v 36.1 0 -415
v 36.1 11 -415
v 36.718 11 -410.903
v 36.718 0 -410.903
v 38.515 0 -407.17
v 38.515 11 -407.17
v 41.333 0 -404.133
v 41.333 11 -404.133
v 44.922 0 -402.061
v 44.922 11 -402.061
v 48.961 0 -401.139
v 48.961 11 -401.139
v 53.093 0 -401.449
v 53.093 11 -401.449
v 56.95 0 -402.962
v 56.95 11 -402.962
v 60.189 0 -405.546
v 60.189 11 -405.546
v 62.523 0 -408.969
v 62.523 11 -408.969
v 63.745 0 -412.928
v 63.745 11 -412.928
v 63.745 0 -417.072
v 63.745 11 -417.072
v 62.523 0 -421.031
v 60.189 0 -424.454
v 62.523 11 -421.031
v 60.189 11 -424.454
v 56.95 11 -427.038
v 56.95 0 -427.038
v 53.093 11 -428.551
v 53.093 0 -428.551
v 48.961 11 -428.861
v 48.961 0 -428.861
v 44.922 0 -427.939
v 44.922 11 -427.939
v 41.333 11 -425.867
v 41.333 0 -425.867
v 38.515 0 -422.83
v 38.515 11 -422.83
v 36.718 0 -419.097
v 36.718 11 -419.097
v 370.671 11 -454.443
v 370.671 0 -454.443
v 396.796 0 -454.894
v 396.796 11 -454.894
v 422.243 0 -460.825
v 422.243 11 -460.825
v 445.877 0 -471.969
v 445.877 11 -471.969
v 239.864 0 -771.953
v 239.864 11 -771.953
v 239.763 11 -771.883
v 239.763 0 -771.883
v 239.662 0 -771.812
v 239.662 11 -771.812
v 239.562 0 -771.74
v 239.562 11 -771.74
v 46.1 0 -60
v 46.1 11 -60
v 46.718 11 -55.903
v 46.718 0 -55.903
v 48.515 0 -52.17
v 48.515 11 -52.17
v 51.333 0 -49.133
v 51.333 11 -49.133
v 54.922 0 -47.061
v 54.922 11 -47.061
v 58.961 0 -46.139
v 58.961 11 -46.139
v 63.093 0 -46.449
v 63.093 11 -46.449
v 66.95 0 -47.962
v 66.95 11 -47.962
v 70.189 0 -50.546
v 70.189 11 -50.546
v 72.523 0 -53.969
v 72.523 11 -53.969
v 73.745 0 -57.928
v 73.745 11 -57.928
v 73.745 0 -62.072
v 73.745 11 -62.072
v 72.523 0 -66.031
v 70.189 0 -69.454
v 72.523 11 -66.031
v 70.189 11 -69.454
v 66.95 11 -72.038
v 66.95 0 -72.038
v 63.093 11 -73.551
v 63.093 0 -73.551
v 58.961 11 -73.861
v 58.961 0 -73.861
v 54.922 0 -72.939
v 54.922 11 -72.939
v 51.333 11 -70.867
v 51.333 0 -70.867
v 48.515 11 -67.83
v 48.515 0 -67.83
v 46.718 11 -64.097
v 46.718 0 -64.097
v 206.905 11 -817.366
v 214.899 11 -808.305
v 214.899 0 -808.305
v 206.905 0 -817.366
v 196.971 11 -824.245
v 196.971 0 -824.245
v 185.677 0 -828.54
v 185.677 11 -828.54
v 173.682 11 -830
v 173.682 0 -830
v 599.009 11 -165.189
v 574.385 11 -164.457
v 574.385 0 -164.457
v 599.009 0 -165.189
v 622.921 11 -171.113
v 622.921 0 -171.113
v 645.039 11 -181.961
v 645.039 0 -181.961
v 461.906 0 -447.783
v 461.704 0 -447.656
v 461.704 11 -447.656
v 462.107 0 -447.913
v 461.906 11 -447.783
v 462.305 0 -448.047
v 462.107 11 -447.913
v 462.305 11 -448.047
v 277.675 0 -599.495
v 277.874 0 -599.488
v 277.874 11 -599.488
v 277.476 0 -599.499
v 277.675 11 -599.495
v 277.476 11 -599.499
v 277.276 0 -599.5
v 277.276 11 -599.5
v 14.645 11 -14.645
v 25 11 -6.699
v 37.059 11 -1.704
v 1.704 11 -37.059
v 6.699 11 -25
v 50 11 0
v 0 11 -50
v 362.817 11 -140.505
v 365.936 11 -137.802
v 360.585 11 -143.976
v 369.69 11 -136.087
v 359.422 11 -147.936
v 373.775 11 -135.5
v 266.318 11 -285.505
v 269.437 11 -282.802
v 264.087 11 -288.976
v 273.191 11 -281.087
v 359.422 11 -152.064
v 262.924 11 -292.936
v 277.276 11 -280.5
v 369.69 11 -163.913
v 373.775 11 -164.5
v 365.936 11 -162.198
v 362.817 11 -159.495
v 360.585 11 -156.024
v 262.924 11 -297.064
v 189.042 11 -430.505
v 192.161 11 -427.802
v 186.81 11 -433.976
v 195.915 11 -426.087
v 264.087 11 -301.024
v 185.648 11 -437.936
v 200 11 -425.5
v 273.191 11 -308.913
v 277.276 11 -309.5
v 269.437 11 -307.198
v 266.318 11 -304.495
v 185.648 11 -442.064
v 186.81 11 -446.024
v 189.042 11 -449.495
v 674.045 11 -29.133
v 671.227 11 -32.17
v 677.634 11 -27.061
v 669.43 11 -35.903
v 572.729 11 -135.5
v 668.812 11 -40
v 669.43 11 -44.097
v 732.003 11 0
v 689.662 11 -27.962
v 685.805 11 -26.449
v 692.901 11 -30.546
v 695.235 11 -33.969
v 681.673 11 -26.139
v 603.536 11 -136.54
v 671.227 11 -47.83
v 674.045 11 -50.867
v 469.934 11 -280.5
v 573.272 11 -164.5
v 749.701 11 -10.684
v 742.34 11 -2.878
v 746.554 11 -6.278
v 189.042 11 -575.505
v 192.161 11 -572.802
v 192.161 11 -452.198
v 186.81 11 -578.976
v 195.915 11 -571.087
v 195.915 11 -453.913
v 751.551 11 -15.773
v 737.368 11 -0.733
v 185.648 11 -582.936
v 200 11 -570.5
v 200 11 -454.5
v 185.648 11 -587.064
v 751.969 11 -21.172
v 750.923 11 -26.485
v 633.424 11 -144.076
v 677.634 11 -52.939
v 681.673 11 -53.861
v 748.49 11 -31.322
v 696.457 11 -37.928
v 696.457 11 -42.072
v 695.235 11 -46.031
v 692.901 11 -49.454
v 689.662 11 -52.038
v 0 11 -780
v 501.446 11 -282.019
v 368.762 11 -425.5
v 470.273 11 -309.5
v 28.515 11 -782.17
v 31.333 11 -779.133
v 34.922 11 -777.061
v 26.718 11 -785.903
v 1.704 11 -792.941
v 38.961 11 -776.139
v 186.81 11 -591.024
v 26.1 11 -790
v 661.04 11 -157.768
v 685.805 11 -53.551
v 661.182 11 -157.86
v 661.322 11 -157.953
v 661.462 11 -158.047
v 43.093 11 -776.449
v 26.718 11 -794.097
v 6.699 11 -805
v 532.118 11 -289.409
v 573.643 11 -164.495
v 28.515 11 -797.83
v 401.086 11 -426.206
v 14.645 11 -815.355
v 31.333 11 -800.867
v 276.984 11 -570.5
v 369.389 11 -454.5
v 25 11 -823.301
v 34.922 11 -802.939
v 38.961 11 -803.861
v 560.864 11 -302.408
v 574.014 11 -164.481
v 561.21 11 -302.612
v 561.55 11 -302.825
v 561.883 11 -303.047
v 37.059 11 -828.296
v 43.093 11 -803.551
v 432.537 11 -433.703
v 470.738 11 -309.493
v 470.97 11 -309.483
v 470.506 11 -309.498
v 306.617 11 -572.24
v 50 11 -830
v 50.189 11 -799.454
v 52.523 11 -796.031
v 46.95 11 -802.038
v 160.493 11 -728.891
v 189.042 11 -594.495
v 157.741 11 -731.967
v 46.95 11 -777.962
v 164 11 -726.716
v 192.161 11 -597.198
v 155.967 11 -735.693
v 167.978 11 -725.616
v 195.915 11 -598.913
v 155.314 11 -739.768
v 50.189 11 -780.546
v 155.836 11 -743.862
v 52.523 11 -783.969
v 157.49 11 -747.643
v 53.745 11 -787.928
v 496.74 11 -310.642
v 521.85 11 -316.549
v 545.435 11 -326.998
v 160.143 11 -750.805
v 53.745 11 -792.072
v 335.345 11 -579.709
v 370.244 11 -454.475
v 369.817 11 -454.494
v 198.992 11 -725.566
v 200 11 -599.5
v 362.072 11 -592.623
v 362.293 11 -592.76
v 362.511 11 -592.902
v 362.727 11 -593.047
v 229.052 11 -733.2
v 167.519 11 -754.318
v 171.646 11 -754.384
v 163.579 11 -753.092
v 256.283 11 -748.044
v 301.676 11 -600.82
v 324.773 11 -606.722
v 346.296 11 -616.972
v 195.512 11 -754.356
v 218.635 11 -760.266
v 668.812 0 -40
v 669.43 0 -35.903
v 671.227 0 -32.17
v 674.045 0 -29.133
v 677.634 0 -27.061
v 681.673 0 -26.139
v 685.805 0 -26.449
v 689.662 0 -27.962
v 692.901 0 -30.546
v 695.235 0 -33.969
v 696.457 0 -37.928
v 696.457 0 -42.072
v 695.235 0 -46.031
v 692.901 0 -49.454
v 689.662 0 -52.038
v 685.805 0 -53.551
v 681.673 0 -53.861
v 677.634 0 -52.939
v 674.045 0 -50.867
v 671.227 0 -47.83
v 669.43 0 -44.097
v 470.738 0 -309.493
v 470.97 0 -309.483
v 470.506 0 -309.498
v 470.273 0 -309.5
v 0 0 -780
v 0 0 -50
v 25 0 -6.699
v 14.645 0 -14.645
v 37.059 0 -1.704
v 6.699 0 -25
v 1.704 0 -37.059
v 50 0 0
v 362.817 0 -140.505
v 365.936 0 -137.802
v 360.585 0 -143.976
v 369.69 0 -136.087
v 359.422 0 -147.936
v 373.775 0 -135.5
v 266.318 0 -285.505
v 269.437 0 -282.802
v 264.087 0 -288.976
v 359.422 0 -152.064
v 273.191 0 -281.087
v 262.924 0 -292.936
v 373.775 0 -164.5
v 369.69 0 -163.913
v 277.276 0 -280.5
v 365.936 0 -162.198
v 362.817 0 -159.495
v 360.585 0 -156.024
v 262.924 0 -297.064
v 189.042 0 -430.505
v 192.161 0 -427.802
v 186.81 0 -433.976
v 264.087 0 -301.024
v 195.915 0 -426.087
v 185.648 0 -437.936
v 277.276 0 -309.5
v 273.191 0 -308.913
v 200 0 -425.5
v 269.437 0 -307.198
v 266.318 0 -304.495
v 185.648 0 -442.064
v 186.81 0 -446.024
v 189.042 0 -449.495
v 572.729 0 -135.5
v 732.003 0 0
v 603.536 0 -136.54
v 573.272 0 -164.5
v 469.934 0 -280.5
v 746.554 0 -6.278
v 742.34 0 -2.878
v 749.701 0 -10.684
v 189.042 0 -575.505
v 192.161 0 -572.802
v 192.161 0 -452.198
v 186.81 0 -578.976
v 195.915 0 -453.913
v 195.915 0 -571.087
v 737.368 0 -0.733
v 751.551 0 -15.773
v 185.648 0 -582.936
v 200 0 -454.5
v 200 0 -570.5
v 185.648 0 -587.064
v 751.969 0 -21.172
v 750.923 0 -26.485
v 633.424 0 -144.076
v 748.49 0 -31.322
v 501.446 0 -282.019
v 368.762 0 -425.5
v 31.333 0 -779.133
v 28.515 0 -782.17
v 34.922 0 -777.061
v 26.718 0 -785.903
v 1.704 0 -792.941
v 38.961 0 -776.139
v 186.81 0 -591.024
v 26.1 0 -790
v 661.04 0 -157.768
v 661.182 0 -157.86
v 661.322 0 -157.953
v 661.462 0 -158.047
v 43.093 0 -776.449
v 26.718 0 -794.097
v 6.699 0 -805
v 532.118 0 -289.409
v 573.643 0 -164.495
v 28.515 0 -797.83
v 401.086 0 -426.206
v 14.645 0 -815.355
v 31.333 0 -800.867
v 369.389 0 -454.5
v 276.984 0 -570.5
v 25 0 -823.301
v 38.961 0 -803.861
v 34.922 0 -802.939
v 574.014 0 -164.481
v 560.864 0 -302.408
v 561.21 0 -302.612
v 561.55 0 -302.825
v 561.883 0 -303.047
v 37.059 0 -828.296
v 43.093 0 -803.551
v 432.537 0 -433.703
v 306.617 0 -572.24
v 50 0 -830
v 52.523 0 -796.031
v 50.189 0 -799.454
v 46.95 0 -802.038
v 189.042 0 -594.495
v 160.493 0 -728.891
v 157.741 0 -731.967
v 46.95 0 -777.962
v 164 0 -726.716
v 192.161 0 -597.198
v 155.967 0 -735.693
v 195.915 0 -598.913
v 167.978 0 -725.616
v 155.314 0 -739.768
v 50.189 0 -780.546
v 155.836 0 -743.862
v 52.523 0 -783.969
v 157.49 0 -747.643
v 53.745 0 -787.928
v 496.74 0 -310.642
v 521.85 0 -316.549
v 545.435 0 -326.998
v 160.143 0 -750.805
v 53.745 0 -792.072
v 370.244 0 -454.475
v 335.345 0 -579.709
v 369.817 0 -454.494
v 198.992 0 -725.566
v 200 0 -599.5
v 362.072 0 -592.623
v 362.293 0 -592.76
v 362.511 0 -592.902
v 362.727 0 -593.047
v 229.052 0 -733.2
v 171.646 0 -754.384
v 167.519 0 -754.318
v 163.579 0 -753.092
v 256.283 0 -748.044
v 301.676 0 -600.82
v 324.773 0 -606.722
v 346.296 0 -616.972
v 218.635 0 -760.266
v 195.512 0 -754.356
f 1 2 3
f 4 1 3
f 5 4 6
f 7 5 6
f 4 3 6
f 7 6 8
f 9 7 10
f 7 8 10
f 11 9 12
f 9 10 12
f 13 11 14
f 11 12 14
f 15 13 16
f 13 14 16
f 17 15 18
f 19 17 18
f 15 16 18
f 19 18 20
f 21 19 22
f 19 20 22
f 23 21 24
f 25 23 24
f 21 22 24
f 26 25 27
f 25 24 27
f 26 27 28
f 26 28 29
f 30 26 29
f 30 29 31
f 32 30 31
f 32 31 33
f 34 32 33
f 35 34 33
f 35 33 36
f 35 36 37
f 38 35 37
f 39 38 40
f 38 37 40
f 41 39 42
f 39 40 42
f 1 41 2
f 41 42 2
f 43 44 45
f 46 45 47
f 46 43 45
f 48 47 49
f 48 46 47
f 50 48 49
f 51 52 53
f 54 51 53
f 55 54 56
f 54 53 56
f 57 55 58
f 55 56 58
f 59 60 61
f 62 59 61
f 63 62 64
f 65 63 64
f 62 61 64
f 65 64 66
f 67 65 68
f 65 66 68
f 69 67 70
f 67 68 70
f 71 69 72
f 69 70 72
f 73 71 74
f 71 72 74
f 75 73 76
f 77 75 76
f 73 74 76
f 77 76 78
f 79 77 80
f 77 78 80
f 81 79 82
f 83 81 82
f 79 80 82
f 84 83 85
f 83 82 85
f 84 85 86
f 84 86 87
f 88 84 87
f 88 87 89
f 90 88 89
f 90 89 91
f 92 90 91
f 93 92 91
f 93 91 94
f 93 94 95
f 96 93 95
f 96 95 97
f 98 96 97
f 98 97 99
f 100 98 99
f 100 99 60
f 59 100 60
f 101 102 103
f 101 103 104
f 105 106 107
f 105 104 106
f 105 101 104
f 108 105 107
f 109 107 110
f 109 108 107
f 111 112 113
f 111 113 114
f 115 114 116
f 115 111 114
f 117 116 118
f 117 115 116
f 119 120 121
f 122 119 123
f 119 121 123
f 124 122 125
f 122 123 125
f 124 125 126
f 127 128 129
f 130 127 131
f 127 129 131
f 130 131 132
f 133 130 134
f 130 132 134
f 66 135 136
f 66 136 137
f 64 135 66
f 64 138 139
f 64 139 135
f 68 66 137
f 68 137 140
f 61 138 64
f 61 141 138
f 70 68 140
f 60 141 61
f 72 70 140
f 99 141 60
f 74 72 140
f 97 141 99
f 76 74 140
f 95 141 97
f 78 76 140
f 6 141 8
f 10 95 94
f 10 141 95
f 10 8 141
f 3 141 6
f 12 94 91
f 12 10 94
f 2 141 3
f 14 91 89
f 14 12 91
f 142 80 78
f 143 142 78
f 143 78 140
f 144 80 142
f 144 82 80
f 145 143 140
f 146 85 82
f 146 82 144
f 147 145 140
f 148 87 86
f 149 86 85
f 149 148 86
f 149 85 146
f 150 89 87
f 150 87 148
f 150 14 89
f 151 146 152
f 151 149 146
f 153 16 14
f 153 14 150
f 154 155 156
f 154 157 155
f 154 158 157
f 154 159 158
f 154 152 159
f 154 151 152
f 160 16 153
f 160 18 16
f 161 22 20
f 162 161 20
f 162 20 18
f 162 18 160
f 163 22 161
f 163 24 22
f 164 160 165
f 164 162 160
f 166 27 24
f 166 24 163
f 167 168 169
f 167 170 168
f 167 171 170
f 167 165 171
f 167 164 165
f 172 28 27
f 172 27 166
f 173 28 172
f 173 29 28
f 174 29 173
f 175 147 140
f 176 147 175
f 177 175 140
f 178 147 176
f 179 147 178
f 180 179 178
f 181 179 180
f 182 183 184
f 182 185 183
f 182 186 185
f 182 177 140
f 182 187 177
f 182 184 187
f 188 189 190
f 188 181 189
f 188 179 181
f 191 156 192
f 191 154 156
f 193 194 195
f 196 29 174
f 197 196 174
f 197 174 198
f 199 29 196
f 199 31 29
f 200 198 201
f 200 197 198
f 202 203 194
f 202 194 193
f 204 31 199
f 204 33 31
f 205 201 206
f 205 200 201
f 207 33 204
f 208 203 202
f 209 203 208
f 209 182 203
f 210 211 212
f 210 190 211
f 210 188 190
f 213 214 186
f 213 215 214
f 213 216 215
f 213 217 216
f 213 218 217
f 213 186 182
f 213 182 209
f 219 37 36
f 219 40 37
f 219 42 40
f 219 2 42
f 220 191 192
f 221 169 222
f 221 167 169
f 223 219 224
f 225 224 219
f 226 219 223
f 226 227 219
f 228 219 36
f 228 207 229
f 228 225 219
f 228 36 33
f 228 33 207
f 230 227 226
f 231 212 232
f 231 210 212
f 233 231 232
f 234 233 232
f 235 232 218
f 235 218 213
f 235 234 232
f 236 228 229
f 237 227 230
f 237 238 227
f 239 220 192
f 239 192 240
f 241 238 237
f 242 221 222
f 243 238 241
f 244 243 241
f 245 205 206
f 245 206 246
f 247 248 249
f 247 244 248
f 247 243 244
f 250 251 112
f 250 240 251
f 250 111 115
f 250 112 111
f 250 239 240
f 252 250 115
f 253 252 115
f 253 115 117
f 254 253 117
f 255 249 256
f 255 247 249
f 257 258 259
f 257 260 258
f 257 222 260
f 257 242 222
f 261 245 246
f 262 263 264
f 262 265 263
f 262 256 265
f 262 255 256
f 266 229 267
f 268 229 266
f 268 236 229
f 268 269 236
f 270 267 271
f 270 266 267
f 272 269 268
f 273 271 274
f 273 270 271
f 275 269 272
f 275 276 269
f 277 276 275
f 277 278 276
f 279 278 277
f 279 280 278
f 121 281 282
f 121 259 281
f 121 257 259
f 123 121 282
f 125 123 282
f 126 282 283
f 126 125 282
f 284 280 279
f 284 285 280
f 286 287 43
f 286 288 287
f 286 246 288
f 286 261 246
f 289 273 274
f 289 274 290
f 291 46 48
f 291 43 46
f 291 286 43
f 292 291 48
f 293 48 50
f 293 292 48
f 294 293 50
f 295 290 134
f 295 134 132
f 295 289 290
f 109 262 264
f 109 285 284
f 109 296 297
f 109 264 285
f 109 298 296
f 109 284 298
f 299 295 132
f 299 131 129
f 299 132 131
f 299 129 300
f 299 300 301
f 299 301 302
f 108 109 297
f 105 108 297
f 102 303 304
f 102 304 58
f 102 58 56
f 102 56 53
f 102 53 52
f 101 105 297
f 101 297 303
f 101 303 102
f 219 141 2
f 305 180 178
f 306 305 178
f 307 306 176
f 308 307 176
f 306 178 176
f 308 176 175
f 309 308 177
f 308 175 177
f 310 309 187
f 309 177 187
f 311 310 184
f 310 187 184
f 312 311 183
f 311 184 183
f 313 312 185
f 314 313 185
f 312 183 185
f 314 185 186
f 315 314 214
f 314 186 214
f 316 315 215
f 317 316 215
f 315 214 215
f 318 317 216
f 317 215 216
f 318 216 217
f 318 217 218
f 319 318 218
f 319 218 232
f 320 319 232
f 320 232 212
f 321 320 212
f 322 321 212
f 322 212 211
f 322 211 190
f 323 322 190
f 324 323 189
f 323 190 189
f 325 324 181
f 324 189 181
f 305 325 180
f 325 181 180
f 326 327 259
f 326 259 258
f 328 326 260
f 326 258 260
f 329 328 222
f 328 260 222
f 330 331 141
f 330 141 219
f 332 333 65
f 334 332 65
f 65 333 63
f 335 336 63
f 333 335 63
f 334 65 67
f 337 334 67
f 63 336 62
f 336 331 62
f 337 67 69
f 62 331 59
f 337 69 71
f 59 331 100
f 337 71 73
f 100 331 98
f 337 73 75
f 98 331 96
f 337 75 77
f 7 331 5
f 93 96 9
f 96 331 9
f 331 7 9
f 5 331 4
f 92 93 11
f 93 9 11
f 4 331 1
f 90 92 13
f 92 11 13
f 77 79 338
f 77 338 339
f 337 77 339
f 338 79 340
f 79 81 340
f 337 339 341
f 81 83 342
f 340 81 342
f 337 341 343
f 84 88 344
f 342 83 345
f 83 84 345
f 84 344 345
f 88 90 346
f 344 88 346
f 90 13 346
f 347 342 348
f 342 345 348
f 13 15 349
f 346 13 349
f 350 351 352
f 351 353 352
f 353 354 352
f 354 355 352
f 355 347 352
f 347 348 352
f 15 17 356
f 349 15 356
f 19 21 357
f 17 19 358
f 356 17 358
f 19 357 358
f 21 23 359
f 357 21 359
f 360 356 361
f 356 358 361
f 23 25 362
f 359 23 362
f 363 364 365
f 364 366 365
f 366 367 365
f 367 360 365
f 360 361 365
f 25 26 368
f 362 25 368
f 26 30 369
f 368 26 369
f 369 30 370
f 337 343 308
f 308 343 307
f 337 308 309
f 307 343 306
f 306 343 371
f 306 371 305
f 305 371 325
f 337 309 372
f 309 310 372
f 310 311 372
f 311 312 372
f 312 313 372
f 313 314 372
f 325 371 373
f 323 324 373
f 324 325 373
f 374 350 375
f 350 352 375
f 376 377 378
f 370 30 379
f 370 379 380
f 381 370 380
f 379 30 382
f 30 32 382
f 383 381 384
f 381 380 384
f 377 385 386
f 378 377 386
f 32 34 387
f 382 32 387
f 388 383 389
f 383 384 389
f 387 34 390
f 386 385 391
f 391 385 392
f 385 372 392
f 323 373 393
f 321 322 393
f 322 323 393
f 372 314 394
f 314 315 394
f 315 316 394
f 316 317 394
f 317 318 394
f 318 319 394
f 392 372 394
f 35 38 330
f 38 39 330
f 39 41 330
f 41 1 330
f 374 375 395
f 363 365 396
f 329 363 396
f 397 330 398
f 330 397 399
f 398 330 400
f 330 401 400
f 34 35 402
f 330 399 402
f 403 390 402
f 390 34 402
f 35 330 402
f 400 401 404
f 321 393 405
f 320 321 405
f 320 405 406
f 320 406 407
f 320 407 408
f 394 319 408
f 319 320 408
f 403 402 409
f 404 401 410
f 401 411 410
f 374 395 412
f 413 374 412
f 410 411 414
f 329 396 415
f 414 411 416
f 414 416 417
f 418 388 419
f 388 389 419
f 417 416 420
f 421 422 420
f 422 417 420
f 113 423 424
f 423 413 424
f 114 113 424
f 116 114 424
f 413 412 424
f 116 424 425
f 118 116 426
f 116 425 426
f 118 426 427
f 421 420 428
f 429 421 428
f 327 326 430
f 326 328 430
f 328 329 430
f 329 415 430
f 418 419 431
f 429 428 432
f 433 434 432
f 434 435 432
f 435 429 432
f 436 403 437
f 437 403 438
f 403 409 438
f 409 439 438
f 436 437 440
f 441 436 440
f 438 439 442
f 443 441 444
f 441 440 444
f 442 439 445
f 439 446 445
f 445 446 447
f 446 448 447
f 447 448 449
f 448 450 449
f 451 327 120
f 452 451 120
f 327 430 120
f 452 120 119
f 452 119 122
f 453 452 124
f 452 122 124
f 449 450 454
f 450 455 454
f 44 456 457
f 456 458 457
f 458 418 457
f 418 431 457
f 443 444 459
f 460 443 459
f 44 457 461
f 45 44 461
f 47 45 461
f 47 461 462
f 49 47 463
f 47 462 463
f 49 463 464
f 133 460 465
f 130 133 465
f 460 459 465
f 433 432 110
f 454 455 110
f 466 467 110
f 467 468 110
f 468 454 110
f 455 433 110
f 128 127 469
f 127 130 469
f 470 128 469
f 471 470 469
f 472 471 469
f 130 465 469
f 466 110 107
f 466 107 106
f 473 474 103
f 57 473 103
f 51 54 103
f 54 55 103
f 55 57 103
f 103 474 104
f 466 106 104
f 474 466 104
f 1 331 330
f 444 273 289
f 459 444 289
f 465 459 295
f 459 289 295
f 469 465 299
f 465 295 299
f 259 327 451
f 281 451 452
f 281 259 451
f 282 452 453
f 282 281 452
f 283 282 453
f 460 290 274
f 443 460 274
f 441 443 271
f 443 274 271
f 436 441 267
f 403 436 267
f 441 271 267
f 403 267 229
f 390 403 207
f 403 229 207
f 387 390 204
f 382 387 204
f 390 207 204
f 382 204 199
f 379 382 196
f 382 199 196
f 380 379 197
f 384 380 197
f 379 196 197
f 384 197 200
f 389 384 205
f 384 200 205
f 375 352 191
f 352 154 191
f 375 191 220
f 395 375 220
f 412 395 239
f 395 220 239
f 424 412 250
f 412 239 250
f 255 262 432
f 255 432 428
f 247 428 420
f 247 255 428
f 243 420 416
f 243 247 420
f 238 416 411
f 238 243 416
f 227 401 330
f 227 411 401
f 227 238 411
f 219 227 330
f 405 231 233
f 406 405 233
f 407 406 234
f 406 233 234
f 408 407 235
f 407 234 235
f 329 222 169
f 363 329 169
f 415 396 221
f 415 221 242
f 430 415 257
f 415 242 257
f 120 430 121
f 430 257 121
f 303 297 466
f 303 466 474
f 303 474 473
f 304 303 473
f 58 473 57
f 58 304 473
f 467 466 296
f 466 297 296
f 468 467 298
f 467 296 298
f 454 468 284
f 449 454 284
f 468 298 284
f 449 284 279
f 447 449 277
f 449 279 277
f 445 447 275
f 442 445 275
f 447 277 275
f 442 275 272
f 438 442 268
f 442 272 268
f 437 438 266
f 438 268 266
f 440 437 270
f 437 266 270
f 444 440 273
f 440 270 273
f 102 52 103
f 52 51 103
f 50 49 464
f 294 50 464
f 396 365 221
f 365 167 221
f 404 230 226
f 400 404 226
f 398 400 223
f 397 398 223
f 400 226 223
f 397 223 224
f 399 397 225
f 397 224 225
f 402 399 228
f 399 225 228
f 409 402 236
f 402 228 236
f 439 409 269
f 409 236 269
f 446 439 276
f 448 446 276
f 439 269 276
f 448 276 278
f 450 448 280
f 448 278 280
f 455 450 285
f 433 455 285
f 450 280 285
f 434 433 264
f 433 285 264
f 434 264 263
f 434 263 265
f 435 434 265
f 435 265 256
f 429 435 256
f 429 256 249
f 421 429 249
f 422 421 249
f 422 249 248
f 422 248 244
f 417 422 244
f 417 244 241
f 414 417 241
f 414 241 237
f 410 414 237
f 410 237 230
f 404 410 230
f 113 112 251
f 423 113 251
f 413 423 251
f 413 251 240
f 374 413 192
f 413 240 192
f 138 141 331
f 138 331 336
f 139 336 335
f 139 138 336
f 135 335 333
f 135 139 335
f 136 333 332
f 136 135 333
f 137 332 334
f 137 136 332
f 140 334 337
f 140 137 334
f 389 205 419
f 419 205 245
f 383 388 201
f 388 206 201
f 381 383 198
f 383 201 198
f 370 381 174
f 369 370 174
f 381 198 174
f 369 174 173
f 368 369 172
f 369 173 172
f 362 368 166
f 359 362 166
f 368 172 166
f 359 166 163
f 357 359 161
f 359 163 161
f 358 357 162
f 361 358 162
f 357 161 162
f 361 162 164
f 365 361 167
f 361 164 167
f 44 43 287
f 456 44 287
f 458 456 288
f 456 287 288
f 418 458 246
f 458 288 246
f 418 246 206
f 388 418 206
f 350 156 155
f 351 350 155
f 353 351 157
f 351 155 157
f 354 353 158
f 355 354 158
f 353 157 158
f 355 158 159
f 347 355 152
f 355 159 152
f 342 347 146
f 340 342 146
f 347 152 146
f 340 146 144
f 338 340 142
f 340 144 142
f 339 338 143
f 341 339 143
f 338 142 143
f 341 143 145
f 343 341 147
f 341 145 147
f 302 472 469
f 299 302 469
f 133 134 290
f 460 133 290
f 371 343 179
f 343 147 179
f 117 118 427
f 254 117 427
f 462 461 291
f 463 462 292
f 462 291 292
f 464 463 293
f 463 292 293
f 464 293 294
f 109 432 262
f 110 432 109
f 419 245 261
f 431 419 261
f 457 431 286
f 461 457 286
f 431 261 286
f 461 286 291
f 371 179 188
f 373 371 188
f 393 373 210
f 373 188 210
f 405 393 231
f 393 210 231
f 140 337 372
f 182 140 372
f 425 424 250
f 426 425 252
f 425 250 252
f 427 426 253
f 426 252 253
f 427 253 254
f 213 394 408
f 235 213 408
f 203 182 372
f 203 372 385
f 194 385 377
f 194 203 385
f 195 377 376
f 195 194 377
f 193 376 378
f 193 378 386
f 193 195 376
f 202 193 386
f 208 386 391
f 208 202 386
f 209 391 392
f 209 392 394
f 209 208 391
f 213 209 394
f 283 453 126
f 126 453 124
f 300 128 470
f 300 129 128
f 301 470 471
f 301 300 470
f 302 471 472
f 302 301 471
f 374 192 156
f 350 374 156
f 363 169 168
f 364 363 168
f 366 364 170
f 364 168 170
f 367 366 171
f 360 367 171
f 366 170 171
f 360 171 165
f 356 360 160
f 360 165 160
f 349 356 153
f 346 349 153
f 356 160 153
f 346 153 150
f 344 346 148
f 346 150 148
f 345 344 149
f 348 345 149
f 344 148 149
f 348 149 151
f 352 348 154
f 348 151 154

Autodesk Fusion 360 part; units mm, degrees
sketch "Sketch1" plane through (0, 0, 0) normal (0, 1, 0) x (1, 0, 0)
  line L0 (0, 0) -> (0, 830)
  line L1 (0, 830) -> (200, 830)
  line L2 (0, 0) -> (770, 0)
  line L3 (770, 0) -> (200, 830)
  dimension "d1" = 830
  dimension "d2" = 770
extrude "Extrude1" add sketch "Sketch1" along normal blind 11
sketch "Sketch2" plane through (0, 11, 0) normal (0, 1, 0) x (-1, 0, 0)
  line L0 (0, 0) -> (-770, 0)
  line L1 (-770, 0) -> (-200, -830)
  line L2 (-200, -830) -> (0, -830)
  line L3 (0, -830) -> (0, 0)
  arc A0 (-167.9783, -725.6164) -> (-256.5823, -748.2599) centre (-183.687, -848.8237) ccw
  arc A1 (-171.646, -754.3836) -> (-167.9783, -725.6164) centre (-169.8121, -740) ccw
  arc A2 (-171.646, -754.3836) -> (-239.5623, -771.7401) centre (-183.687, -848.8237) ccw
  arc A3 (-256.5823, -748.2599) -> (-239.5623, -771.7401) centre (-248.0723, -760) ccw
  arc A4 (-169.8121, -740) -> (-248.0723, -760) centre (-183.687, -848.8237) ccw construction
  arc A5 (-277.8741, -599.4877) -> (-346.9644, -617.3771) centre (-282.9401, -722.2833) ccw
  arc A6 (-277.8741, -599.4877) -> (-276.6787, -570.5123) centre (-277.2764, -585) ccw
  arc A7 (-276.6787, -570.5123) -> (-362.0718, -592.6229) centre (-282.9401, -722.2833) ccw
  arc A8 (-362.0718, -592.6229) -> (-346.9644, -617.3771) centre (-354.5181, -605) ccw
  arc A9 (-277.2764, -585) -> (-354.5181, -605) centre (-282.9401, -722.2833) ccw construction
  arc A10 (-370.6712, -454.4432) -> (-446.4891, -472.3442) centre (-381.6102, -577.6218) ccw
  arc A11 (-370.6712, -454.4432) -> (-368.1059, -425.5568) centre (-369.3886, -440) ccw
  arc A12 (-368.1059, -425.5568) -> (-461.7037, -447.6558) centre (-381.6102, -577.6218) ccw
  arc A13 (-461.7037, -447.6558) -> (-446.4891, -472.3442) centre (-454.0964, -460) ccw
  arc A14 (-369.3886, -440) -> (-454.0964, -460) centre (-381.6102, -577.6218) ccw construction
  arc A15 (-470.9702, -309.4832) -> (-546.4851, -327.592) centre (-477.6426, -448.1642) ccw
  arc A16 (-470.9702, -309.4832) -> (-469.5765, -280.5168) centre (-470.2734, -295) ccw
  arc A17 (-469.5765, -280.5168) -> (-560.8643, -302.408) centre (-477.6426, -448.1642) ccw
  arc A18 (-560.8643, -302.408) -> (-546.4851, -327.592) centre (-553.6747, -315) ccw
  arc A19 (-470.2734, -295) -> (-553.6747, -315) centre (-477.6426, -448.1642) ccw construction
  arc A20 (-574.3852, -164.4572) -> (-645.4659, -182.2316) centre (-583.2764, -279.9159) ccw
  arc A21 (-574.3852, -164.4572) -> (-572.1585, -135.5428) centre (-573.2718, -150) ccw
  arc A22 (-572.1585, -135.5428) -> (-661.0401, -157.7684) centre (-583.2764, -279.9159) ccw
  arc A23 (-661.0401, -157.7684) -> (-645.4659, -182.2316) centre (-653.253, -170) ccw
  arc A24 (-573.2718, -150) -> (-653.253, -170) centre (-583.2764, -279.9159) ccw construction
  line L4 (-573.2718, -164.5) -> (-373.7749, -164.5)
  arc A25 (-373.7749, -164.5) -> (-373.7749, -135.5) centre (-373.7749, -150) ccw
  line L5 (-373.7749, -135.5) -> (-573.2718, -135.5)
  arc A26 (-573.2718, -135.5) -> (-573.2718, -164.5) centre (-573.2718, -150) ccw
  line L6 (-573.2718, -150) -> (-373.7749, -150) construction
  line L7 (-470.2734, -309.5) -> (-277.2764, -309.5)
  arc A27 (-277.2764, -309.5) -> (-277.2764, -280.5) centre (-277.2764, -295) ccw
  line L8 (-277.2764, -280.5) -> (-470.2734, -280.5)
  arc A28 (-470.2734, -280.5) -> (-470.2734, -309.5) centre (-470.2734, -295) ccw
  line L9 (-470.2734, -295) -> (-277.2764, -295) construction
  line L10 (-369.3886, -454.5) -> (-200, -454.5)
  arc A29 (-200, -454.5) -> (-200, -425.5) centre (-200, -440) ccw
  line L11 (-200, -425.5) -> (-369.3886, -425.5)
  arc A30 (-369.3886, -425.5) -> (-369.3886, -454.5) centre (-369.3886, -440) ccw
  line L12 (-369.3886, -440) -> (-200, -440) construction
  line L13 (-277.2764, -599.5) -> (-200, -599.5)
  arc A31 (-200, -599.5) -> (-200, -570.5) centre (-200, -585) ccw
  line L14 (-200, -570.5) -> (-277.2764, -570.5)
  arc A32 (-277.2764, -570.5) -> (-277.2764, -599.5) centre (-277.2764, -585) ccw
  line L15 (-277.2764, -585) -> (-200, -585) construction
  dimension "d13" = 90
  dimension "d14" = 245
  dimension "d15" = 390
  dimension "d16" = 390
  dimension "d17" = 535
  dimension "d18" = 535
  dimension "d19" = 680
  dimension "d20" = 680
  dimension "d21" = 29
  dimension "d22" = 29
  dimension "d23" = 29
  dimension "d24" = 29
  dimension "d25" = 29
  dimension "d26" = 20
  dimension "d27" = 20
  dimension "d28" = 20
  dimension "d29" = 20
  dimension "d30" = 20
  dimension "d31" = 29
  dimension "d32" = 29
  dimension "d33" = 29
  dimension "d40" = 29
extrude "Extrude2" cut sketch "Sketch2" against normal blind 12 contours L1 A20 A22 A23 L5 A26 | L1 A20 A23 | L1 A0 A3 | L1 A0 A1 A2 A3 | L1 A15 A17 A18 L8 A28 | L1 A15 A18 | A21 A22 L5 A26 | A21 A22 L4 A25 L5 | L1 A5 A8 | L1 A5 A7 A8 L14 A32 | L1 A10 A12 A13 L11 A30 | L1 A10 A13 | A16 A17 L8 A28 | A16 A17 L7 A27 L8 | A6 A7 L14 A32 | A11 A12 L11 A30 | A11 A12 L10 A29 L11
fillet "Fillet1" radius 50 1 edges at (0, 5.5, -830)
fillet "Fillet2" radius 50 1 edges at (200, 5.5, -830)
fillet "Fillet3" radius 50 1 edges at (0, 5.5, 0)
fillet "Fillet4" radius 20 1 edges at (770, 5.5, 0)
extrude "Extrude3" cut sketch "Sketch2" against normal blind 12 contours A6 A7 L13 A31 L14
sketch "Sketch3" plane through (0, 11, 0) normal (0, 1, 0) x (-1, 0, 0)
  line L0 (-276.9849, -570.5) -> (-200, -570.5)
  arc A0 (-200, -599.5) -> (-200, -570.5) centre (-200, -585) ccw
  line L1 (-200, -599.5) -> (-277.2764, -599.5)
  arc A1 (-277.8741, -599.4877) -> (-277.2764, -599.5) centre (-277.2764, -585) ccw
  arc A2 (-277.8741, -599.4877) -> (-346.2962, -616.9722) centre (-282.9401, -722.2833) ccw
  line L2 (-346.2962, -616.9722) -> (-256.2832, -748.0438)
  arc A3 (-167.9783, -725.6164) -> (-256.2832, -748.0438) centre (-183.687, -848.8237) ccw
  arc A4 (-171.646, -754.3836) -> (-167.9783, -725.6164) centre (-169.8121, -740) ccw
  arc A5 (-171.646, -754.3836) -> (-239.5623, -771.7401) centre (-183.687, -848.8237) ccw
  arc A6 (-239.8637, -771.9528) -> (-239.5623, -771.7401) centre (-248.0723, -760) ccw
  line L3 (-239.8637, -771.9528) -> (-214.8987, -808.3054)
  arc A7 (-214.8987, -808.3054) -> (-173.6821, -830) centre (-173.6821, -780) ccw
  line L4 (-173.6821, -830) -> (-50, -830)
  arc A8 (-50, -830) -> (0, -780) centre (-50, -780) ccw
  line L5 (0, -780) -> (0, -50)
  arc A9 (0, -50) -> (-50, 0) centre (-50, -50) ccw
  line L6 (-50, 0) -> (-732.003, 0)
  arc A10 (-732.003, 0) -> (-748.4896, -31.3221) centre (-732.003, -20) ccw
  line L7 (-748.4896, -31.3221) -> (-661.4616, -158.0472)
  arc A11 (-661.0401, -157.7684) -> (-661.4616, -158.0472) centre (-653.253, -170) ccw
  arc A12 (-572.7291, -135.5) -> (-661.0401, -157.7684) centre (-583.2764, -279.9159) ccw
  line L8 (-572.7291, -135.5) -> (-373.7749, -135.5)
  arc A13 (-373.7749, -164.5) -> (-373.7749, -135.5) centre (-373.7749, -150) ccw
  line L9 (-373.7749, -164.5) -> (-573.2718, -164.5)
  arc A14 (-574.3852, -164.4572) -> (-573.2718, -164.5) centre (-573.2718, -150) ccw
  arc A15 (-574.3852, -164.4572) -> (-645.0388, -181.961) centre (-583.2764, -279.9159) ccw
  line L10 (-645.0388, -181.961) -> (-561.8833, -303.0472)
  arc A16 (-560.8643, -302.408) -> (-561.8833, -303.0472) centre (-553.6747, -315) ccw
  arc A17 (-469.9326, -280.5) -> (-560.8643, -302.408) centre (-477.6426, -448.1642) ccw
  line L11 (-469.9326, -280.5) -> (-277.2764, -280.5)
  arc A18 (-277.2764, -309.5) -> (-277.2764, -280.5) centre (-277.2764, -295) ccw
  line L12 (-277.2764, -309.5) -> (-470.2734, -309.5)
  arc A19 (-470.9702, -309.4832) -> (-470.2734, -309.5) centre (-470.2734, -295) ccw
  arc A20 (-470.9702, -309.4832) -> (-545.4348, -326.9984) centre (-477.6426, -448.1642) ccw
  line L13 (-545.4348, -326.9984) -> (-462.3049, -448.0472)
  arc A21 (-461.7037, -447.6558) -> (-462.3049, -448.0472) centre (-454.0964, -460) ccw
  arc A22 (-368.762, -425.5) -> (-461.7037, -447.6558) centre (-381.6102, -577.6218) ccw
  line L14 (-368.762, -425.5) -> (-200, -425.5)
  arc A23 (-200, -454.5) -> (-200, -425.5) centre (-200, -440) ccw
  line L15 (-200, -454.5) -> (-369.3886, -454.5)
  arc A24 (-370.6712, -454.4432) -> (-369.3886, -454.5) centre (-369.3886, -440) ccw
  arc A25 (-370.6712, -454.4432) -> (-445.8766, -471.9692) centre (-381.6102, -577.6218) ccw
  line L16 (-445.8766, -471.9692) -> (-362.7266, -593.0472)
  arc A26 (-362.0718, -592.6229) -> (-362.7266, -593.0472) centre (-354.5181, -605) ccw
  arc A27 (-276.9849, -570.5) -> (-362.0718, -592.6229) centre (-282.9401, -722.2833) ccw
  circle A28 centre (-40, -790) radius 13.9
  circle A29 centre (-60, -60) radius 13.9
  circle A30 centre (-682.712, -40) radius 13.9
  circle A31 centre (-50, -415) radius 13.9
  dimension "d43" = 27.8
  dimension "d44" = 40
  dimension "d45" = 40
  dimension "d46" = 27.8
  dimension "d47" = 27.8
  dimension "d48" = 60
  dimension "d49" = 60
  dimension "d50" = 40
  dimension "d51" = 27.8
  dimension "d52" = 50
  dimension "d53" = 415
extrude "Extrude4" cut sketch "Sketch3" against normal blind 12 contours A28 | A29 | A30 | A31
